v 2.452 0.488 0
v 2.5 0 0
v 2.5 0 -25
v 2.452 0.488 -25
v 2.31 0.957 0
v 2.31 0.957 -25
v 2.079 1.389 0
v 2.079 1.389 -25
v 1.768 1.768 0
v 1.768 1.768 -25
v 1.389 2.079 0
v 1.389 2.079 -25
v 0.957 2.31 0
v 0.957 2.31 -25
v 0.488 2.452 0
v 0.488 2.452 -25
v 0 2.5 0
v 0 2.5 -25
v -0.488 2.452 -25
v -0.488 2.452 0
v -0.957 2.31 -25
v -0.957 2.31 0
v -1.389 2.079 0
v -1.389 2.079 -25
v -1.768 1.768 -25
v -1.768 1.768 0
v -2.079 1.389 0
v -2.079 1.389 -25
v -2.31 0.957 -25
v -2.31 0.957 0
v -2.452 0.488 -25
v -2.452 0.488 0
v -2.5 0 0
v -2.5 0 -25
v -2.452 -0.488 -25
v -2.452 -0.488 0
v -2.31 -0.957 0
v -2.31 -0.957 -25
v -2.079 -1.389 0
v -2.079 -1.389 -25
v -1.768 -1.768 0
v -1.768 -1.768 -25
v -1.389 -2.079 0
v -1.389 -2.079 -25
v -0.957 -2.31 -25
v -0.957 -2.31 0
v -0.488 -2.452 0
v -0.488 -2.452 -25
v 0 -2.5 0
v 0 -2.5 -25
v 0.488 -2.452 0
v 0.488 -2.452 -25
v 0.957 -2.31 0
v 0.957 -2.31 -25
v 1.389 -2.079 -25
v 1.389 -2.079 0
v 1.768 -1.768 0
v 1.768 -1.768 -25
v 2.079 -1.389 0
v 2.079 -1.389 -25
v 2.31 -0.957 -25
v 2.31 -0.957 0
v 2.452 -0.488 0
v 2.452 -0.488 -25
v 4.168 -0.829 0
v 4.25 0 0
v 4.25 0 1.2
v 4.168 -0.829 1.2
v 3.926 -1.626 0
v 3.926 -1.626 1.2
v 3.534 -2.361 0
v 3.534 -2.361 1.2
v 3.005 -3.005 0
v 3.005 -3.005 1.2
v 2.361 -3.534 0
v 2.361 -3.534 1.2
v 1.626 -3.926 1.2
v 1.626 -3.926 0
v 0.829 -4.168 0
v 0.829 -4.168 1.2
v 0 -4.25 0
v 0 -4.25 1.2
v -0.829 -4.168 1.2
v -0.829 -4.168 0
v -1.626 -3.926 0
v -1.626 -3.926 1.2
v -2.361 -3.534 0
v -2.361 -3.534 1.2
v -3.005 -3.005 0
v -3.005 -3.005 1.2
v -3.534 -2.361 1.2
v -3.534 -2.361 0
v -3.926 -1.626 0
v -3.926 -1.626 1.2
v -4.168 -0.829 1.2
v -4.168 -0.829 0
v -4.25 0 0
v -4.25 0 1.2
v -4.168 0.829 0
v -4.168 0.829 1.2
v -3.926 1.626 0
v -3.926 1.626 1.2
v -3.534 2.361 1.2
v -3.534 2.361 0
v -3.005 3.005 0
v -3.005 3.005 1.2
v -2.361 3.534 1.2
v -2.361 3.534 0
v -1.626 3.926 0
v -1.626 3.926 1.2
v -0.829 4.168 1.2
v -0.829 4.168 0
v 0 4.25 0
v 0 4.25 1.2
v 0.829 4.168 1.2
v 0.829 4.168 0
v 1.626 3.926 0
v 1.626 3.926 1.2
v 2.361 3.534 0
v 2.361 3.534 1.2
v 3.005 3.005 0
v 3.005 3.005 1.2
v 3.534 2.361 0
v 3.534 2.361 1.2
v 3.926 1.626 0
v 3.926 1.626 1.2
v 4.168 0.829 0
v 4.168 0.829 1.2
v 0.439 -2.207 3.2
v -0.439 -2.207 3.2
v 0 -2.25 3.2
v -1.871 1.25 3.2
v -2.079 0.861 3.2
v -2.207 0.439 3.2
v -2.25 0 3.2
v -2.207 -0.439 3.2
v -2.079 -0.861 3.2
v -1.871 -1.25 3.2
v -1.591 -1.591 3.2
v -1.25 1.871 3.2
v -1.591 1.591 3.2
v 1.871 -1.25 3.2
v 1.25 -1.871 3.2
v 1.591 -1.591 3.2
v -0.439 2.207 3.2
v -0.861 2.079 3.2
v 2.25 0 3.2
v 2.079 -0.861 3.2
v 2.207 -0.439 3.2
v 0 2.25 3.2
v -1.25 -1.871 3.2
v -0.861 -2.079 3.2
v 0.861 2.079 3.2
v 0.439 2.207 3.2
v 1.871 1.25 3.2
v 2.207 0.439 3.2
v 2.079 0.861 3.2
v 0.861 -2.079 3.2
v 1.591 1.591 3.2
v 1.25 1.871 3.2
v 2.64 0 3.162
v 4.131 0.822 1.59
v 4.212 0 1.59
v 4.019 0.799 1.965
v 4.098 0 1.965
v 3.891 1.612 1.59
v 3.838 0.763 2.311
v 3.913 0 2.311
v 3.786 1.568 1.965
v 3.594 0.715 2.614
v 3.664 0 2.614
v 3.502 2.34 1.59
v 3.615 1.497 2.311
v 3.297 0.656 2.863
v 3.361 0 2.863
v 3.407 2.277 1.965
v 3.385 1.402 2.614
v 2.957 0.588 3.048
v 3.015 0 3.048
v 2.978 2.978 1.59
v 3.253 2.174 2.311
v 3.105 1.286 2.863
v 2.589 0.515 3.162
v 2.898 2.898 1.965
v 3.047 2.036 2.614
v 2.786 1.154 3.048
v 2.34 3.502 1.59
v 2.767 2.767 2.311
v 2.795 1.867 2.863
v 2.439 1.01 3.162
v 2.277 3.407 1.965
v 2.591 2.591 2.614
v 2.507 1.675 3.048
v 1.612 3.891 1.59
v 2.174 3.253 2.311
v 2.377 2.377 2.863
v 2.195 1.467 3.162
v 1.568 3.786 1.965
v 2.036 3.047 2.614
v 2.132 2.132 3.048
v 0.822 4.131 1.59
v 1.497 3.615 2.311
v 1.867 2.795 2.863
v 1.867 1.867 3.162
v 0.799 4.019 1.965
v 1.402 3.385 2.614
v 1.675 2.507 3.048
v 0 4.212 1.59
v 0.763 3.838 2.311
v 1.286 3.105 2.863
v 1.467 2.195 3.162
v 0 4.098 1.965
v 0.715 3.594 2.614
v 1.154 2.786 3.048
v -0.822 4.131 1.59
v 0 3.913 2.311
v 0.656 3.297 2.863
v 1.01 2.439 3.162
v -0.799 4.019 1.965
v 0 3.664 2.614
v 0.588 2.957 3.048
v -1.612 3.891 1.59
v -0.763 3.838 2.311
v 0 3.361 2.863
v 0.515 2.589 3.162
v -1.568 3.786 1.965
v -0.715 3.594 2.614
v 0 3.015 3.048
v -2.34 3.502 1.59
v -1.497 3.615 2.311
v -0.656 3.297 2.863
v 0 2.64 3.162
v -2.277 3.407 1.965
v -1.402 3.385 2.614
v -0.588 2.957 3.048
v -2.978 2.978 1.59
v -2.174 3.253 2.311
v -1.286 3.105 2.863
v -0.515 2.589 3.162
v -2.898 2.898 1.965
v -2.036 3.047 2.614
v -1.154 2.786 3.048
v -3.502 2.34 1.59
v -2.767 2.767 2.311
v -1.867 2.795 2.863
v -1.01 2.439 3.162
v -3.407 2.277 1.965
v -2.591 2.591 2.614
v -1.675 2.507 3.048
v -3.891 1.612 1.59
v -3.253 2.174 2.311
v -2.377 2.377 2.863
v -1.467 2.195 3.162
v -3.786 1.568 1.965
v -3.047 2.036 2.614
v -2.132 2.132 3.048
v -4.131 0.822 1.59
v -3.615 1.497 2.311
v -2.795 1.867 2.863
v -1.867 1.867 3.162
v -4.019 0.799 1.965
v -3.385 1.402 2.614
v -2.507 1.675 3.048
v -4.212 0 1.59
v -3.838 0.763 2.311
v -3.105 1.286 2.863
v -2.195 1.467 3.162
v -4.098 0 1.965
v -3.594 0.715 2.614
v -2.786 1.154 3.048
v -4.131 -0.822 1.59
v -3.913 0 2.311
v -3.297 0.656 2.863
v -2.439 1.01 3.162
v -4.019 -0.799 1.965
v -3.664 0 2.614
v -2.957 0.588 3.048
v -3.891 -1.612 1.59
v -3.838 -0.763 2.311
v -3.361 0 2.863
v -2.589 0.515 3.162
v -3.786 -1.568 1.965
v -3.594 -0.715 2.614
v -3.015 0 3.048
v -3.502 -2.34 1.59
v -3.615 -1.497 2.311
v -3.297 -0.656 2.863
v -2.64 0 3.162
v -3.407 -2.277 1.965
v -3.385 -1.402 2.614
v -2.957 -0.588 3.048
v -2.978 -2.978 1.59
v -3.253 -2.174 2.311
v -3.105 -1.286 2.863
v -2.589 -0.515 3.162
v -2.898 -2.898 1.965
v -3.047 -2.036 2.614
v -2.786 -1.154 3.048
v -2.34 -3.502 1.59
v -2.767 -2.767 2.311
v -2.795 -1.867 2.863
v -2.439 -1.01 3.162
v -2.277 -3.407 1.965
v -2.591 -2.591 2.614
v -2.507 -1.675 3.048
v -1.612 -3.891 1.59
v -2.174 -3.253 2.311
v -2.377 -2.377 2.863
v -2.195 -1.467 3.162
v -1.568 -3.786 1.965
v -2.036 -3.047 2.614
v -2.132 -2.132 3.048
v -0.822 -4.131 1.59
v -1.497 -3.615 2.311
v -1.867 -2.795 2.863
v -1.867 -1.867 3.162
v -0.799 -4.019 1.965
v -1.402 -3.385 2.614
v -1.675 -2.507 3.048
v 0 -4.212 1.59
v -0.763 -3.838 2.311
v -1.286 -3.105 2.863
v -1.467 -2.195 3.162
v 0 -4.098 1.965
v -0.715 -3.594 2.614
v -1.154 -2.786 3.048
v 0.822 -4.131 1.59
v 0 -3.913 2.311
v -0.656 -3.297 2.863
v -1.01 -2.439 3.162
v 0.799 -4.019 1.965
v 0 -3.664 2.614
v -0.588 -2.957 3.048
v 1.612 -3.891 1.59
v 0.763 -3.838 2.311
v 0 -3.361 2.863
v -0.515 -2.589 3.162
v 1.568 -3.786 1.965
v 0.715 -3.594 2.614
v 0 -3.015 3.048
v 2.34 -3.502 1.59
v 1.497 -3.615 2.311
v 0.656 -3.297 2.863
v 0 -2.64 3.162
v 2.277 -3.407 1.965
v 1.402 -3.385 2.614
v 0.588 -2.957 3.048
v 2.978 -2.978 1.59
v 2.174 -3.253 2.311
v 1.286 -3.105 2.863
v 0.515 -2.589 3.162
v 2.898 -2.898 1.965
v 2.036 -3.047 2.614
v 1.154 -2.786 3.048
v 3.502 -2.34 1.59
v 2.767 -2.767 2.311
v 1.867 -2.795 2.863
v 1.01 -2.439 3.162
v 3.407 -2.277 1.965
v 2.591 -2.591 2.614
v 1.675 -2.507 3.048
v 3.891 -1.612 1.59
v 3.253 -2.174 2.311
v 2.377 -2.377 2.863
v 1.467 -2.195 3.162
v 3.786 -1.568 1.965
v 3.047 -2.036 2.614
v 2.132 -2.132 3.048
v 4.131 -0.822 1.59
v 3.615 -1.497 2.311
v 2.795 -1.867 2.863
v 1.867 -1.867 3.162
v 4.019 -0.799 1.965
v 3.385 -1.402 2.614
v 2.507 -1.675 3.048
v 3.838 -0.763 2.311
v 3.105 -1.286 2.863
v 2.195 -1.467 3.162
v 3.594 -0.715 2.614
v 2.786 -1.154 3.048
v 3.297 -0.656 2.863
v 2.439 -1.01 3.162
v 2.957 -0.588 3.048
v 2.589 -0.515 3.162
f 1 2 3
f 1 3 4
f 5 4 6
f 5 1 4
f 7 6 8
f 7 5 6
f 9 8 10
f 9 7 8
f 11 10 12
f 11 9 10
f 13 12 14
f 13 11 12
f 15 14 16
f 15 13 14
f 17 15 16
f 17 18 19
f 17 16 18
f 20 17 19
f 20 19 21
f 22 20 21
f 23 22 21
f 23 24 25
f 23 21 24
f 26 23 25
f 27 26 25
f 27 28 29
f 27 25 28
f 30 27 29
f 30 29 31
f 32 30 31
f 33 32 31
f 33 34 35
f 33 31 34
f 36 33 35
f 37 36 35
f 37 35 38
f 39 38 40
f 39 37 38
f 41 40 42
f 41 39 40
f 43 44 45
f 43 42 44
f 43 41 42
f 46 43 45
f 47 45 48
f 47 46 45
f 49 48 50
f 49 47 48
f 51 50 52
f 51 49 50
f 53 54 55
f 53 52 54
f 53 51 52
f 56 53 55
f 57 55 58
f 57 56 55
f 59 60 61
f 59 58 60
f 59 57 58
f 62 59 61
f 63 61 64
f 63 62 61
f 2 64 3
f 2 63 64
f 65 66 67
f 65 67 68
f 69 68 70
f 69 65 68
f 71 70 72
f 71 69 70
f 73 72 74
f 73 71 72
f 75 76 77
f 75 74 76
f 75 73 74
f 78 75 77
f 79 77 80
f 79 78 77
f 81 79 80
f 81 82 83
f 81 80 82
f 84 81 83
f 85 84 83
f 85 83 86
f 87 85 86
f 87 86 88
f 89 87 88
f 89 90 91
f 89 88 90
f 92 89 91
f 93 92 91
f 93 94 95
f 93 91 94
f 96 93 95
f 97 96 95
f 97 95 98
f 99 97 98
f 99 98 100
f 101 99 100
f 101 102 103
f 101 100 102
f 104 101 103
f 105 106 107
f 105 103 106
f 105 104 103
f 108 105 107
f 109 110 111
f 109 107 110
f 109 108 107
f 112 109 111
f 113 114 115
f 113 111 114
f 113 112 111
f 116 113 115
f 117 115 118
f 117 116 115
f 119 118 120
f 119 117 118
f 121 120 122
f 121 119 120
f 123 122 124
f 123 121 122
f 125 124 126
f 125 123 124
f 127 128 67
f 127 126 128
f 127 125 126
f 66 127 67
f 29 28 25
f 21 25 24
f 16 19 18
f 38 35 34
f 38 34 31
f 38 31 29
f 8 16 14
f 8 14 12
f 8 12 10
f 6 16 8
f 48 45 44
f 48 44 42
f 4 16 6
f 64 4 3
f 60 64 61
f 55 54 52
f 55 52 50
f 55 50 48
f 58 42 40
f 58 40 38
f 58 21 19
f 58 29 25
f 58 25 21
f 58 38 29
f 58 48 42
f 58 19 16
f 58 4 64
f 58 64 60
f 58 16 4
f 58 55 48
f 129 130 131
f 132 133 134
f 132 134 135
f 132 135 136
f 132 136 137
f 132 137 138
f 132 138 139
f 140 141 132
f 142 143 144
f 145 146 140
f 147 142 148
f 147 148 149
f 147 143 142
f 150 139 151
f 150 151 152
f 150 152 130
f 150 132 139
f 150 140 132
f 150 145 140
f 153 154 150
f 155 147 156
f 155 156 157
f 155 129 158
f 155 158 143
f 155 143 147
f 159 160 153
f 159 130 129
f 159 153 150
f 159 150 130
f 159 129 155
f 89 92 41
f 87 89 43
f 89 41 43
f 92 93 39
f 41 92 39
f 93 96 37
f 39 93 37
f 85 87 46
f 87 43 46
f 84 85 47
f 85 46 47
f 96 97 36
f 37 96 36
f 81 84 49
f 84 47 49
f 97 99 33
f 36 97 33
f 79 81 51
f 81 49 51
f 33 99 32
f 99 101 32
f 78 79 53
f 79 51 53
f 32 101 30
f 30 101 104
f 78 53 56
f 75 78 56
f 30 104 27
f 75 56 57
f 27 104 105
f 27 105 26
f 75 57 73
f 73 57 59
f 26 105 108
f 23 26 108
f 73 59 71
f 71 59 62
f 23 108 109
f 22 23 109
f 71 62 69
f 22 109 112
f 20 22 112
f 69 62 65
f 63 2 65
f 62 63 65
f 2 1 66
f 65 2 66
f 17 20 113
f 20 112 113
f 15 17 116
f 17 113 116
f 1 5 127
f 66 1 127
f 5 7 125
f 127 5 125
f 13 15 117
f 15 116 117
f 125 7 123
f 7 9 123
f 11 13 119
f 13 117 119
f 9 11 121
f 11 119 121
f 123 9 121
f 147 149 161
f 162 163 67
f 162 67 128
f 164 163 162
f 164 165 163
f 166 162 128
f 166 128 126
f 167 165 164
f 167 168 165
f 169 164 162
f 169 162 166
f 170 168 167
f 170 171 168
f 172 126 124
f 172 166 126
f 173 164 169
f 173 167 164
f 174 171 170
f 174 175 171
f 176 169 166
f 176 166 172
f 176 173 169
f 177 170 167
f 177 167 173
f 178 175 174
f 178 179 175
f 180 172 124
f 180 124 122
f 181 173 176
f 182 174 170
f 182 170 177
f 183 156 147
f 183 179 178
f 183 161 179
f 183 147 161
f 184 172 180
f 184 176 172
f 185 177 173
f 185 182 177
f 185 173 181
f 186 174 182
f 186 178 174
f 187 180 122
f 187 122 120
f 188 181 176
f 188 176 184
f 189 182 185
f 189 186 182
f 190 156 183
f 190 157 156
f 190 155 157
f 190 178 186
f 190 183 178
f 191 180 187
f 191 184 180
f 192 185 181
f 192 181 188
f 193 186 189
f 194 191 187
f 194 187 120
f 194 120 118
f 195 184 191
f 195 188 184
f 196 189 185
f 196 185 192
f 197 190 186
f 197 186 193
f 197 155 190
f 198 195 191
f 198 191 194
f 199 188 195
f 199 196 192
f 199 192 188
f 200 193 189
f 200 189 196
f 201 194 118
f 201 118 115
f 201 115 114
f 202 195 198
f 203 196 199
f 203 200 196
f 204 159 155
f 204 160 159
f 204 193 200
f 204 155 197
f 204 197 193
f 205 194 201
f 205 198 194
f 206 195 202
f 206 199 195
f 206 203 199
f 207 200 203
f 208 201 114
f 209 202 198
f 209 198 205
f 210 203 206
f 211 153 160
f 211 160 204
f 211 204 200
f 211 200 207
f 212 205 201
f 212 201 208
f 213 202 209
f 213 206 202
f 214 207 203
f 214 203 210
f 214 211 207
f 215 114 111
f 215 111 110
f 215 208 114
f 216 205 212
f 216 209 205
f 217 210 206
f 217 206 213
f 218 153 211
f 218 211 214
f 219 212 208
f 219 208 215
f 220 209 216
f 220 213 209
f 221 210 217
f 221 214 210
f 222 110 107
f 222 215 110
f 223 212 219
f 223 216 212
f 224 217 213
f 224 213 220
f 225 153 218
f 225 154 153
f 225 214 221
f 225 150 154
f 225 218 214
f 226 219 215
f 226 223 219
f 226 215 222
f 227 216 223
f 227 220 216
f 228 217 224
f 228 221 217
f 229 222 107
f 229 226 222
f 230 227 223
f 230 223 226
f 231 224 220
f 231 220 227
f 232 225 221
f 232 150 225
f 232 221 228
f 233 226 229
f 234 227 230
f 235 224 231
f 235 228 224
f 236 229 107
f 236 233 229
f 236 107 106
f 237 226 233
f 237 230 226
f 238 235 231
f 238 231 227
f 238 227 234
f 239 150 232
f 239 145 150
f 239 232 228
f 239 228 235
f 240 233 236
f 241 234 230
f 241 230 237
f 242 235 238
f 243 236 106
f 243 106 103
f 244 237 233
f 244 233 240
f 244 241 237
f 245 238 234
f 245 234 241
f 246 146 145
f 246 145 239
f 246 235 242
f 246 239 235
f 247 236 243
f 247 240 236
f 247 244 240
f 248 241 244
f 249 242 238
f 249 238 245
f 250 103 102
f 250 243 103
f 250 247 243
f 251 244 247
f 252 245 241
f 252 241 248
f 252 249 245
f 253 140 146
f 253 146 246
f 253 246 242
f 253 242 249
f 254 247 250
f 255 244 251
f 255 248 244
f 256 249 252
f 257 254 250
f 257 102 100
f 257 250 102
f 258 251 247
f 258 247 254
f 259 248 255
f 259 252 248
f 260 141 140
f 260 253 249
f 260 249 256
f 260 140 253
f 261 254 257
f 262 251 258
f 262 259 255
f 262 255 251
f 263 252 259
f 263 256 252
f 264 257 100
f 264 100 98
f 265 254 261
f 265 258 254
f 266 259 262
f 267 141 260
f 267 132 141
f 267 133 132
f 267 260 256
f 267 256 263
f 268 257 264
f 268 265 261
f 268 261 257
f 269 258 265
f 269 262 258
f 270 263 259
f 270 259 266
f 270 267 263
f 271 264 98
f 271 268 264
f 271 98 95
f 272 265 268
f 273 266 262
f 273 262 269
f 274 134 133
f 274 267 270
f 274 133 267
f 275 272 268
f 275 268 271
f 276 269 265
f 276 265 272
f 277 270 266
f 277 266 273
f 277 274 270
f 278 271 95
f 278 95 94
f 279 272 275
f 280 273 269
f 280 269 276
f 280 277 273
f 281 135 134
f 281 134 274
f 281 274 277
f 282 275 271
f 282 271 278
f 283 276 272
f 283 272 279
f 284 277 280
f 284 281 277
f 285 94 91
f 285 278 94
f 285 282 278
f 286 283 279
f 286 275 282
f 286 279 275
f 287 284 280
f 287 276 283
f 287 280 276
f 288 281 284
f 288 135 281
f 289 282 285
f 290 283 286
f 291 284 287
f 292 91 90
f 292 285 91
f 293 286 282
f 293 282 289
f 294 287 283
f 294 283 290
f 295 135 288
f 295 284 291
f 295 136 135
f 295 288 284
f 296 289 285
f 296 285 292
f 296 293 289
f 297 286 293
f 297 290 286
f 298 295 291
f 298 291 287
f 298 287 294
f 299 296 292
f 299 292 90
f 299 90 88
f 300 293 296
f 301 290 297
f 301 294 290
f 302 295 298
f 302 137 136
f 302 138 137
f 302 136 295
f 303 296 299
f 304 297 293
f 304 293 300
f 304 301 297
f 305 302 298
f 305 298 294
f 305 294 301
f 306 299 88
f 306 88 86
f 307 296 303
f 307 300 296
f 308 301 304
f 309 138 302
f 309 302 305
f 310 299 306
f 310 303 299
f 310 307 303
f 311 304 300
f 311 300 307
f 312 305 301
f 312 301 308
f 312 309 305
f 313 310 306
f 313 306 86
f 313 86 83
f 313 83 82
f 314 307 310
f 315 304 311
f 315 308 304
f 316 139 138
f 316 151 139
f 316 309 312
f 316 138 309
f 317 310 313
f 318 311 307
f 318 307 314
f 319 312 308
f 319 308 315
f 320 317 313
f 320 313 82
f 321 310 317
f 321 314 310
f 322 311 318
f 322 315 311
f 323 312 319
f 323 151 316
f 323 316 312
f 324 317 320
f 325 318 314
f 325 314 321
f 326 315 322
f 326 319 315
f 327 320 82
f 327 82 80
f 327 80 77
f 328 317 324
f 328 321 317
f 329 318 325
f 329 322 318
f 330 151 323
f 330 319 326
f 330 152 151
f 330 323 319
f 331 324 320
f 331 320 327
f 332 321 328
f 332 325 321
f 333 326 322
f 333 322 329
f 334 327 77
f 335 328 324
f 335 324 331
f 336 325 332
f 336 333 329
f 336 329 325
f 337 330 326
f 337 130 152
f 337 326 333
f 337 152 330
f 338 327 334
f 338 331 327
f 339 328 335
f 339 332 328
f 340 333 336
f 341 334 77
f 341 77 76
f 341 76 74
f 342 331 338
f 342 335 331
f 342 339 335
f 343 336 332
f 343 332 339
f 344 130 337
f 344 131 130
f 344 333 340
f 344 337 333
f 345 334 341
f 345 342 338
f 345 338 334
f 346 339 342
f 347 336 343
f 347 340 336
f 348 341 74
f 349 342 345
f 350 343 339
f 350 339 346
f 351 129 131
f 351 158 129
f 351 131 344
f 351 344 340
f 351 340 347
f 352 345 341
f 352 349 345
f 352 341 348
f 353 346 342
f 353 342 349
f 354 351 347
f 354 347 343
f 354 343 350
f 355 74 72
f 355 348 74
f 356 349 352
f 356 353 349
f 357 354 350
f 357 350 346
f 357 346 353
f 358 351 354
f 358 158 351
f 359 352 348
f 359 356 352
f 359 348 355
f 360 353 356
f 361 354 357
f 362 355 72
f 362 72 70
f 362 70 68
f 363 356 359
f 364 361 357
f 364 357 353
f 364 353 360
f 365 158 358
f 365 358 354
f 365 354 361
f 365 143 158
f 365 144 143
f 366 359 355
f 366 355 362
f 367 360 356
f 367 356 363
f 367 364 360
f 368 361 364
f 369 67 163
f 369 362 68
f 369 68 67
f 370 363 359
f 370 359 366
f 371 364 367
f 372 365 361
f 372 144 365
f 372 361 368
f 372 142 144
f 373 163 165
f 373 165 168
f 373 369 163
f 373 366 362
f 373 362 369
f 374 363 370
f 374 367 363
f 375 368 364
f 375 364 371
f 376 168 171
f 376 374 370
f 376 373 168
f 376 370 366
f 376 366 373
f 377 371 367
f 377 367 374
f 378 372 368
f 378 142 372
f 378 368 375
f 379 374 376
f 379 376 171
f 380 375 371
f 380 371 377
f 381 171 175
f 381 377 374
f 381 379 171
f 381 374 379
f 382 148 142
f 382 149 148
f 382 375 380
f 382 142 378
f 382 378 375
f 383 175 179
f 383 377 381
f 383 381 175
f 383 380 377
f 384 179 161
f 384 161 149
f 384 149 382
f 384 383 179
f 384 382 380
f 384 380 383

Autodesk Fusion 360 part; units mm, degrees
sketch "草图1" plane through (0, 0, 0) normal (0, 0, 1) x (1, 0, 0)
  circle A0 centre (0, 0) radius 4.25
  dimension "d1" = 8.5
extrude "拉伸1" add sketch "草图1" along normal blind 3.2
fillet "圆角1" radius 2 1 edges at (-3.9624, -1.5369, 3.2)
sketch "草图2" plane through (0, 0, 0) normal (0, 0, -1) x (1, 0, 0)
  circle A0 centre (0, 0) radius 4.25
  circle A1 centre (0, 0) radius 2.5
  dimension "d6" = 5
extrude "拉伸2" add sketch "草图2" along normal blind 25 contours A1
